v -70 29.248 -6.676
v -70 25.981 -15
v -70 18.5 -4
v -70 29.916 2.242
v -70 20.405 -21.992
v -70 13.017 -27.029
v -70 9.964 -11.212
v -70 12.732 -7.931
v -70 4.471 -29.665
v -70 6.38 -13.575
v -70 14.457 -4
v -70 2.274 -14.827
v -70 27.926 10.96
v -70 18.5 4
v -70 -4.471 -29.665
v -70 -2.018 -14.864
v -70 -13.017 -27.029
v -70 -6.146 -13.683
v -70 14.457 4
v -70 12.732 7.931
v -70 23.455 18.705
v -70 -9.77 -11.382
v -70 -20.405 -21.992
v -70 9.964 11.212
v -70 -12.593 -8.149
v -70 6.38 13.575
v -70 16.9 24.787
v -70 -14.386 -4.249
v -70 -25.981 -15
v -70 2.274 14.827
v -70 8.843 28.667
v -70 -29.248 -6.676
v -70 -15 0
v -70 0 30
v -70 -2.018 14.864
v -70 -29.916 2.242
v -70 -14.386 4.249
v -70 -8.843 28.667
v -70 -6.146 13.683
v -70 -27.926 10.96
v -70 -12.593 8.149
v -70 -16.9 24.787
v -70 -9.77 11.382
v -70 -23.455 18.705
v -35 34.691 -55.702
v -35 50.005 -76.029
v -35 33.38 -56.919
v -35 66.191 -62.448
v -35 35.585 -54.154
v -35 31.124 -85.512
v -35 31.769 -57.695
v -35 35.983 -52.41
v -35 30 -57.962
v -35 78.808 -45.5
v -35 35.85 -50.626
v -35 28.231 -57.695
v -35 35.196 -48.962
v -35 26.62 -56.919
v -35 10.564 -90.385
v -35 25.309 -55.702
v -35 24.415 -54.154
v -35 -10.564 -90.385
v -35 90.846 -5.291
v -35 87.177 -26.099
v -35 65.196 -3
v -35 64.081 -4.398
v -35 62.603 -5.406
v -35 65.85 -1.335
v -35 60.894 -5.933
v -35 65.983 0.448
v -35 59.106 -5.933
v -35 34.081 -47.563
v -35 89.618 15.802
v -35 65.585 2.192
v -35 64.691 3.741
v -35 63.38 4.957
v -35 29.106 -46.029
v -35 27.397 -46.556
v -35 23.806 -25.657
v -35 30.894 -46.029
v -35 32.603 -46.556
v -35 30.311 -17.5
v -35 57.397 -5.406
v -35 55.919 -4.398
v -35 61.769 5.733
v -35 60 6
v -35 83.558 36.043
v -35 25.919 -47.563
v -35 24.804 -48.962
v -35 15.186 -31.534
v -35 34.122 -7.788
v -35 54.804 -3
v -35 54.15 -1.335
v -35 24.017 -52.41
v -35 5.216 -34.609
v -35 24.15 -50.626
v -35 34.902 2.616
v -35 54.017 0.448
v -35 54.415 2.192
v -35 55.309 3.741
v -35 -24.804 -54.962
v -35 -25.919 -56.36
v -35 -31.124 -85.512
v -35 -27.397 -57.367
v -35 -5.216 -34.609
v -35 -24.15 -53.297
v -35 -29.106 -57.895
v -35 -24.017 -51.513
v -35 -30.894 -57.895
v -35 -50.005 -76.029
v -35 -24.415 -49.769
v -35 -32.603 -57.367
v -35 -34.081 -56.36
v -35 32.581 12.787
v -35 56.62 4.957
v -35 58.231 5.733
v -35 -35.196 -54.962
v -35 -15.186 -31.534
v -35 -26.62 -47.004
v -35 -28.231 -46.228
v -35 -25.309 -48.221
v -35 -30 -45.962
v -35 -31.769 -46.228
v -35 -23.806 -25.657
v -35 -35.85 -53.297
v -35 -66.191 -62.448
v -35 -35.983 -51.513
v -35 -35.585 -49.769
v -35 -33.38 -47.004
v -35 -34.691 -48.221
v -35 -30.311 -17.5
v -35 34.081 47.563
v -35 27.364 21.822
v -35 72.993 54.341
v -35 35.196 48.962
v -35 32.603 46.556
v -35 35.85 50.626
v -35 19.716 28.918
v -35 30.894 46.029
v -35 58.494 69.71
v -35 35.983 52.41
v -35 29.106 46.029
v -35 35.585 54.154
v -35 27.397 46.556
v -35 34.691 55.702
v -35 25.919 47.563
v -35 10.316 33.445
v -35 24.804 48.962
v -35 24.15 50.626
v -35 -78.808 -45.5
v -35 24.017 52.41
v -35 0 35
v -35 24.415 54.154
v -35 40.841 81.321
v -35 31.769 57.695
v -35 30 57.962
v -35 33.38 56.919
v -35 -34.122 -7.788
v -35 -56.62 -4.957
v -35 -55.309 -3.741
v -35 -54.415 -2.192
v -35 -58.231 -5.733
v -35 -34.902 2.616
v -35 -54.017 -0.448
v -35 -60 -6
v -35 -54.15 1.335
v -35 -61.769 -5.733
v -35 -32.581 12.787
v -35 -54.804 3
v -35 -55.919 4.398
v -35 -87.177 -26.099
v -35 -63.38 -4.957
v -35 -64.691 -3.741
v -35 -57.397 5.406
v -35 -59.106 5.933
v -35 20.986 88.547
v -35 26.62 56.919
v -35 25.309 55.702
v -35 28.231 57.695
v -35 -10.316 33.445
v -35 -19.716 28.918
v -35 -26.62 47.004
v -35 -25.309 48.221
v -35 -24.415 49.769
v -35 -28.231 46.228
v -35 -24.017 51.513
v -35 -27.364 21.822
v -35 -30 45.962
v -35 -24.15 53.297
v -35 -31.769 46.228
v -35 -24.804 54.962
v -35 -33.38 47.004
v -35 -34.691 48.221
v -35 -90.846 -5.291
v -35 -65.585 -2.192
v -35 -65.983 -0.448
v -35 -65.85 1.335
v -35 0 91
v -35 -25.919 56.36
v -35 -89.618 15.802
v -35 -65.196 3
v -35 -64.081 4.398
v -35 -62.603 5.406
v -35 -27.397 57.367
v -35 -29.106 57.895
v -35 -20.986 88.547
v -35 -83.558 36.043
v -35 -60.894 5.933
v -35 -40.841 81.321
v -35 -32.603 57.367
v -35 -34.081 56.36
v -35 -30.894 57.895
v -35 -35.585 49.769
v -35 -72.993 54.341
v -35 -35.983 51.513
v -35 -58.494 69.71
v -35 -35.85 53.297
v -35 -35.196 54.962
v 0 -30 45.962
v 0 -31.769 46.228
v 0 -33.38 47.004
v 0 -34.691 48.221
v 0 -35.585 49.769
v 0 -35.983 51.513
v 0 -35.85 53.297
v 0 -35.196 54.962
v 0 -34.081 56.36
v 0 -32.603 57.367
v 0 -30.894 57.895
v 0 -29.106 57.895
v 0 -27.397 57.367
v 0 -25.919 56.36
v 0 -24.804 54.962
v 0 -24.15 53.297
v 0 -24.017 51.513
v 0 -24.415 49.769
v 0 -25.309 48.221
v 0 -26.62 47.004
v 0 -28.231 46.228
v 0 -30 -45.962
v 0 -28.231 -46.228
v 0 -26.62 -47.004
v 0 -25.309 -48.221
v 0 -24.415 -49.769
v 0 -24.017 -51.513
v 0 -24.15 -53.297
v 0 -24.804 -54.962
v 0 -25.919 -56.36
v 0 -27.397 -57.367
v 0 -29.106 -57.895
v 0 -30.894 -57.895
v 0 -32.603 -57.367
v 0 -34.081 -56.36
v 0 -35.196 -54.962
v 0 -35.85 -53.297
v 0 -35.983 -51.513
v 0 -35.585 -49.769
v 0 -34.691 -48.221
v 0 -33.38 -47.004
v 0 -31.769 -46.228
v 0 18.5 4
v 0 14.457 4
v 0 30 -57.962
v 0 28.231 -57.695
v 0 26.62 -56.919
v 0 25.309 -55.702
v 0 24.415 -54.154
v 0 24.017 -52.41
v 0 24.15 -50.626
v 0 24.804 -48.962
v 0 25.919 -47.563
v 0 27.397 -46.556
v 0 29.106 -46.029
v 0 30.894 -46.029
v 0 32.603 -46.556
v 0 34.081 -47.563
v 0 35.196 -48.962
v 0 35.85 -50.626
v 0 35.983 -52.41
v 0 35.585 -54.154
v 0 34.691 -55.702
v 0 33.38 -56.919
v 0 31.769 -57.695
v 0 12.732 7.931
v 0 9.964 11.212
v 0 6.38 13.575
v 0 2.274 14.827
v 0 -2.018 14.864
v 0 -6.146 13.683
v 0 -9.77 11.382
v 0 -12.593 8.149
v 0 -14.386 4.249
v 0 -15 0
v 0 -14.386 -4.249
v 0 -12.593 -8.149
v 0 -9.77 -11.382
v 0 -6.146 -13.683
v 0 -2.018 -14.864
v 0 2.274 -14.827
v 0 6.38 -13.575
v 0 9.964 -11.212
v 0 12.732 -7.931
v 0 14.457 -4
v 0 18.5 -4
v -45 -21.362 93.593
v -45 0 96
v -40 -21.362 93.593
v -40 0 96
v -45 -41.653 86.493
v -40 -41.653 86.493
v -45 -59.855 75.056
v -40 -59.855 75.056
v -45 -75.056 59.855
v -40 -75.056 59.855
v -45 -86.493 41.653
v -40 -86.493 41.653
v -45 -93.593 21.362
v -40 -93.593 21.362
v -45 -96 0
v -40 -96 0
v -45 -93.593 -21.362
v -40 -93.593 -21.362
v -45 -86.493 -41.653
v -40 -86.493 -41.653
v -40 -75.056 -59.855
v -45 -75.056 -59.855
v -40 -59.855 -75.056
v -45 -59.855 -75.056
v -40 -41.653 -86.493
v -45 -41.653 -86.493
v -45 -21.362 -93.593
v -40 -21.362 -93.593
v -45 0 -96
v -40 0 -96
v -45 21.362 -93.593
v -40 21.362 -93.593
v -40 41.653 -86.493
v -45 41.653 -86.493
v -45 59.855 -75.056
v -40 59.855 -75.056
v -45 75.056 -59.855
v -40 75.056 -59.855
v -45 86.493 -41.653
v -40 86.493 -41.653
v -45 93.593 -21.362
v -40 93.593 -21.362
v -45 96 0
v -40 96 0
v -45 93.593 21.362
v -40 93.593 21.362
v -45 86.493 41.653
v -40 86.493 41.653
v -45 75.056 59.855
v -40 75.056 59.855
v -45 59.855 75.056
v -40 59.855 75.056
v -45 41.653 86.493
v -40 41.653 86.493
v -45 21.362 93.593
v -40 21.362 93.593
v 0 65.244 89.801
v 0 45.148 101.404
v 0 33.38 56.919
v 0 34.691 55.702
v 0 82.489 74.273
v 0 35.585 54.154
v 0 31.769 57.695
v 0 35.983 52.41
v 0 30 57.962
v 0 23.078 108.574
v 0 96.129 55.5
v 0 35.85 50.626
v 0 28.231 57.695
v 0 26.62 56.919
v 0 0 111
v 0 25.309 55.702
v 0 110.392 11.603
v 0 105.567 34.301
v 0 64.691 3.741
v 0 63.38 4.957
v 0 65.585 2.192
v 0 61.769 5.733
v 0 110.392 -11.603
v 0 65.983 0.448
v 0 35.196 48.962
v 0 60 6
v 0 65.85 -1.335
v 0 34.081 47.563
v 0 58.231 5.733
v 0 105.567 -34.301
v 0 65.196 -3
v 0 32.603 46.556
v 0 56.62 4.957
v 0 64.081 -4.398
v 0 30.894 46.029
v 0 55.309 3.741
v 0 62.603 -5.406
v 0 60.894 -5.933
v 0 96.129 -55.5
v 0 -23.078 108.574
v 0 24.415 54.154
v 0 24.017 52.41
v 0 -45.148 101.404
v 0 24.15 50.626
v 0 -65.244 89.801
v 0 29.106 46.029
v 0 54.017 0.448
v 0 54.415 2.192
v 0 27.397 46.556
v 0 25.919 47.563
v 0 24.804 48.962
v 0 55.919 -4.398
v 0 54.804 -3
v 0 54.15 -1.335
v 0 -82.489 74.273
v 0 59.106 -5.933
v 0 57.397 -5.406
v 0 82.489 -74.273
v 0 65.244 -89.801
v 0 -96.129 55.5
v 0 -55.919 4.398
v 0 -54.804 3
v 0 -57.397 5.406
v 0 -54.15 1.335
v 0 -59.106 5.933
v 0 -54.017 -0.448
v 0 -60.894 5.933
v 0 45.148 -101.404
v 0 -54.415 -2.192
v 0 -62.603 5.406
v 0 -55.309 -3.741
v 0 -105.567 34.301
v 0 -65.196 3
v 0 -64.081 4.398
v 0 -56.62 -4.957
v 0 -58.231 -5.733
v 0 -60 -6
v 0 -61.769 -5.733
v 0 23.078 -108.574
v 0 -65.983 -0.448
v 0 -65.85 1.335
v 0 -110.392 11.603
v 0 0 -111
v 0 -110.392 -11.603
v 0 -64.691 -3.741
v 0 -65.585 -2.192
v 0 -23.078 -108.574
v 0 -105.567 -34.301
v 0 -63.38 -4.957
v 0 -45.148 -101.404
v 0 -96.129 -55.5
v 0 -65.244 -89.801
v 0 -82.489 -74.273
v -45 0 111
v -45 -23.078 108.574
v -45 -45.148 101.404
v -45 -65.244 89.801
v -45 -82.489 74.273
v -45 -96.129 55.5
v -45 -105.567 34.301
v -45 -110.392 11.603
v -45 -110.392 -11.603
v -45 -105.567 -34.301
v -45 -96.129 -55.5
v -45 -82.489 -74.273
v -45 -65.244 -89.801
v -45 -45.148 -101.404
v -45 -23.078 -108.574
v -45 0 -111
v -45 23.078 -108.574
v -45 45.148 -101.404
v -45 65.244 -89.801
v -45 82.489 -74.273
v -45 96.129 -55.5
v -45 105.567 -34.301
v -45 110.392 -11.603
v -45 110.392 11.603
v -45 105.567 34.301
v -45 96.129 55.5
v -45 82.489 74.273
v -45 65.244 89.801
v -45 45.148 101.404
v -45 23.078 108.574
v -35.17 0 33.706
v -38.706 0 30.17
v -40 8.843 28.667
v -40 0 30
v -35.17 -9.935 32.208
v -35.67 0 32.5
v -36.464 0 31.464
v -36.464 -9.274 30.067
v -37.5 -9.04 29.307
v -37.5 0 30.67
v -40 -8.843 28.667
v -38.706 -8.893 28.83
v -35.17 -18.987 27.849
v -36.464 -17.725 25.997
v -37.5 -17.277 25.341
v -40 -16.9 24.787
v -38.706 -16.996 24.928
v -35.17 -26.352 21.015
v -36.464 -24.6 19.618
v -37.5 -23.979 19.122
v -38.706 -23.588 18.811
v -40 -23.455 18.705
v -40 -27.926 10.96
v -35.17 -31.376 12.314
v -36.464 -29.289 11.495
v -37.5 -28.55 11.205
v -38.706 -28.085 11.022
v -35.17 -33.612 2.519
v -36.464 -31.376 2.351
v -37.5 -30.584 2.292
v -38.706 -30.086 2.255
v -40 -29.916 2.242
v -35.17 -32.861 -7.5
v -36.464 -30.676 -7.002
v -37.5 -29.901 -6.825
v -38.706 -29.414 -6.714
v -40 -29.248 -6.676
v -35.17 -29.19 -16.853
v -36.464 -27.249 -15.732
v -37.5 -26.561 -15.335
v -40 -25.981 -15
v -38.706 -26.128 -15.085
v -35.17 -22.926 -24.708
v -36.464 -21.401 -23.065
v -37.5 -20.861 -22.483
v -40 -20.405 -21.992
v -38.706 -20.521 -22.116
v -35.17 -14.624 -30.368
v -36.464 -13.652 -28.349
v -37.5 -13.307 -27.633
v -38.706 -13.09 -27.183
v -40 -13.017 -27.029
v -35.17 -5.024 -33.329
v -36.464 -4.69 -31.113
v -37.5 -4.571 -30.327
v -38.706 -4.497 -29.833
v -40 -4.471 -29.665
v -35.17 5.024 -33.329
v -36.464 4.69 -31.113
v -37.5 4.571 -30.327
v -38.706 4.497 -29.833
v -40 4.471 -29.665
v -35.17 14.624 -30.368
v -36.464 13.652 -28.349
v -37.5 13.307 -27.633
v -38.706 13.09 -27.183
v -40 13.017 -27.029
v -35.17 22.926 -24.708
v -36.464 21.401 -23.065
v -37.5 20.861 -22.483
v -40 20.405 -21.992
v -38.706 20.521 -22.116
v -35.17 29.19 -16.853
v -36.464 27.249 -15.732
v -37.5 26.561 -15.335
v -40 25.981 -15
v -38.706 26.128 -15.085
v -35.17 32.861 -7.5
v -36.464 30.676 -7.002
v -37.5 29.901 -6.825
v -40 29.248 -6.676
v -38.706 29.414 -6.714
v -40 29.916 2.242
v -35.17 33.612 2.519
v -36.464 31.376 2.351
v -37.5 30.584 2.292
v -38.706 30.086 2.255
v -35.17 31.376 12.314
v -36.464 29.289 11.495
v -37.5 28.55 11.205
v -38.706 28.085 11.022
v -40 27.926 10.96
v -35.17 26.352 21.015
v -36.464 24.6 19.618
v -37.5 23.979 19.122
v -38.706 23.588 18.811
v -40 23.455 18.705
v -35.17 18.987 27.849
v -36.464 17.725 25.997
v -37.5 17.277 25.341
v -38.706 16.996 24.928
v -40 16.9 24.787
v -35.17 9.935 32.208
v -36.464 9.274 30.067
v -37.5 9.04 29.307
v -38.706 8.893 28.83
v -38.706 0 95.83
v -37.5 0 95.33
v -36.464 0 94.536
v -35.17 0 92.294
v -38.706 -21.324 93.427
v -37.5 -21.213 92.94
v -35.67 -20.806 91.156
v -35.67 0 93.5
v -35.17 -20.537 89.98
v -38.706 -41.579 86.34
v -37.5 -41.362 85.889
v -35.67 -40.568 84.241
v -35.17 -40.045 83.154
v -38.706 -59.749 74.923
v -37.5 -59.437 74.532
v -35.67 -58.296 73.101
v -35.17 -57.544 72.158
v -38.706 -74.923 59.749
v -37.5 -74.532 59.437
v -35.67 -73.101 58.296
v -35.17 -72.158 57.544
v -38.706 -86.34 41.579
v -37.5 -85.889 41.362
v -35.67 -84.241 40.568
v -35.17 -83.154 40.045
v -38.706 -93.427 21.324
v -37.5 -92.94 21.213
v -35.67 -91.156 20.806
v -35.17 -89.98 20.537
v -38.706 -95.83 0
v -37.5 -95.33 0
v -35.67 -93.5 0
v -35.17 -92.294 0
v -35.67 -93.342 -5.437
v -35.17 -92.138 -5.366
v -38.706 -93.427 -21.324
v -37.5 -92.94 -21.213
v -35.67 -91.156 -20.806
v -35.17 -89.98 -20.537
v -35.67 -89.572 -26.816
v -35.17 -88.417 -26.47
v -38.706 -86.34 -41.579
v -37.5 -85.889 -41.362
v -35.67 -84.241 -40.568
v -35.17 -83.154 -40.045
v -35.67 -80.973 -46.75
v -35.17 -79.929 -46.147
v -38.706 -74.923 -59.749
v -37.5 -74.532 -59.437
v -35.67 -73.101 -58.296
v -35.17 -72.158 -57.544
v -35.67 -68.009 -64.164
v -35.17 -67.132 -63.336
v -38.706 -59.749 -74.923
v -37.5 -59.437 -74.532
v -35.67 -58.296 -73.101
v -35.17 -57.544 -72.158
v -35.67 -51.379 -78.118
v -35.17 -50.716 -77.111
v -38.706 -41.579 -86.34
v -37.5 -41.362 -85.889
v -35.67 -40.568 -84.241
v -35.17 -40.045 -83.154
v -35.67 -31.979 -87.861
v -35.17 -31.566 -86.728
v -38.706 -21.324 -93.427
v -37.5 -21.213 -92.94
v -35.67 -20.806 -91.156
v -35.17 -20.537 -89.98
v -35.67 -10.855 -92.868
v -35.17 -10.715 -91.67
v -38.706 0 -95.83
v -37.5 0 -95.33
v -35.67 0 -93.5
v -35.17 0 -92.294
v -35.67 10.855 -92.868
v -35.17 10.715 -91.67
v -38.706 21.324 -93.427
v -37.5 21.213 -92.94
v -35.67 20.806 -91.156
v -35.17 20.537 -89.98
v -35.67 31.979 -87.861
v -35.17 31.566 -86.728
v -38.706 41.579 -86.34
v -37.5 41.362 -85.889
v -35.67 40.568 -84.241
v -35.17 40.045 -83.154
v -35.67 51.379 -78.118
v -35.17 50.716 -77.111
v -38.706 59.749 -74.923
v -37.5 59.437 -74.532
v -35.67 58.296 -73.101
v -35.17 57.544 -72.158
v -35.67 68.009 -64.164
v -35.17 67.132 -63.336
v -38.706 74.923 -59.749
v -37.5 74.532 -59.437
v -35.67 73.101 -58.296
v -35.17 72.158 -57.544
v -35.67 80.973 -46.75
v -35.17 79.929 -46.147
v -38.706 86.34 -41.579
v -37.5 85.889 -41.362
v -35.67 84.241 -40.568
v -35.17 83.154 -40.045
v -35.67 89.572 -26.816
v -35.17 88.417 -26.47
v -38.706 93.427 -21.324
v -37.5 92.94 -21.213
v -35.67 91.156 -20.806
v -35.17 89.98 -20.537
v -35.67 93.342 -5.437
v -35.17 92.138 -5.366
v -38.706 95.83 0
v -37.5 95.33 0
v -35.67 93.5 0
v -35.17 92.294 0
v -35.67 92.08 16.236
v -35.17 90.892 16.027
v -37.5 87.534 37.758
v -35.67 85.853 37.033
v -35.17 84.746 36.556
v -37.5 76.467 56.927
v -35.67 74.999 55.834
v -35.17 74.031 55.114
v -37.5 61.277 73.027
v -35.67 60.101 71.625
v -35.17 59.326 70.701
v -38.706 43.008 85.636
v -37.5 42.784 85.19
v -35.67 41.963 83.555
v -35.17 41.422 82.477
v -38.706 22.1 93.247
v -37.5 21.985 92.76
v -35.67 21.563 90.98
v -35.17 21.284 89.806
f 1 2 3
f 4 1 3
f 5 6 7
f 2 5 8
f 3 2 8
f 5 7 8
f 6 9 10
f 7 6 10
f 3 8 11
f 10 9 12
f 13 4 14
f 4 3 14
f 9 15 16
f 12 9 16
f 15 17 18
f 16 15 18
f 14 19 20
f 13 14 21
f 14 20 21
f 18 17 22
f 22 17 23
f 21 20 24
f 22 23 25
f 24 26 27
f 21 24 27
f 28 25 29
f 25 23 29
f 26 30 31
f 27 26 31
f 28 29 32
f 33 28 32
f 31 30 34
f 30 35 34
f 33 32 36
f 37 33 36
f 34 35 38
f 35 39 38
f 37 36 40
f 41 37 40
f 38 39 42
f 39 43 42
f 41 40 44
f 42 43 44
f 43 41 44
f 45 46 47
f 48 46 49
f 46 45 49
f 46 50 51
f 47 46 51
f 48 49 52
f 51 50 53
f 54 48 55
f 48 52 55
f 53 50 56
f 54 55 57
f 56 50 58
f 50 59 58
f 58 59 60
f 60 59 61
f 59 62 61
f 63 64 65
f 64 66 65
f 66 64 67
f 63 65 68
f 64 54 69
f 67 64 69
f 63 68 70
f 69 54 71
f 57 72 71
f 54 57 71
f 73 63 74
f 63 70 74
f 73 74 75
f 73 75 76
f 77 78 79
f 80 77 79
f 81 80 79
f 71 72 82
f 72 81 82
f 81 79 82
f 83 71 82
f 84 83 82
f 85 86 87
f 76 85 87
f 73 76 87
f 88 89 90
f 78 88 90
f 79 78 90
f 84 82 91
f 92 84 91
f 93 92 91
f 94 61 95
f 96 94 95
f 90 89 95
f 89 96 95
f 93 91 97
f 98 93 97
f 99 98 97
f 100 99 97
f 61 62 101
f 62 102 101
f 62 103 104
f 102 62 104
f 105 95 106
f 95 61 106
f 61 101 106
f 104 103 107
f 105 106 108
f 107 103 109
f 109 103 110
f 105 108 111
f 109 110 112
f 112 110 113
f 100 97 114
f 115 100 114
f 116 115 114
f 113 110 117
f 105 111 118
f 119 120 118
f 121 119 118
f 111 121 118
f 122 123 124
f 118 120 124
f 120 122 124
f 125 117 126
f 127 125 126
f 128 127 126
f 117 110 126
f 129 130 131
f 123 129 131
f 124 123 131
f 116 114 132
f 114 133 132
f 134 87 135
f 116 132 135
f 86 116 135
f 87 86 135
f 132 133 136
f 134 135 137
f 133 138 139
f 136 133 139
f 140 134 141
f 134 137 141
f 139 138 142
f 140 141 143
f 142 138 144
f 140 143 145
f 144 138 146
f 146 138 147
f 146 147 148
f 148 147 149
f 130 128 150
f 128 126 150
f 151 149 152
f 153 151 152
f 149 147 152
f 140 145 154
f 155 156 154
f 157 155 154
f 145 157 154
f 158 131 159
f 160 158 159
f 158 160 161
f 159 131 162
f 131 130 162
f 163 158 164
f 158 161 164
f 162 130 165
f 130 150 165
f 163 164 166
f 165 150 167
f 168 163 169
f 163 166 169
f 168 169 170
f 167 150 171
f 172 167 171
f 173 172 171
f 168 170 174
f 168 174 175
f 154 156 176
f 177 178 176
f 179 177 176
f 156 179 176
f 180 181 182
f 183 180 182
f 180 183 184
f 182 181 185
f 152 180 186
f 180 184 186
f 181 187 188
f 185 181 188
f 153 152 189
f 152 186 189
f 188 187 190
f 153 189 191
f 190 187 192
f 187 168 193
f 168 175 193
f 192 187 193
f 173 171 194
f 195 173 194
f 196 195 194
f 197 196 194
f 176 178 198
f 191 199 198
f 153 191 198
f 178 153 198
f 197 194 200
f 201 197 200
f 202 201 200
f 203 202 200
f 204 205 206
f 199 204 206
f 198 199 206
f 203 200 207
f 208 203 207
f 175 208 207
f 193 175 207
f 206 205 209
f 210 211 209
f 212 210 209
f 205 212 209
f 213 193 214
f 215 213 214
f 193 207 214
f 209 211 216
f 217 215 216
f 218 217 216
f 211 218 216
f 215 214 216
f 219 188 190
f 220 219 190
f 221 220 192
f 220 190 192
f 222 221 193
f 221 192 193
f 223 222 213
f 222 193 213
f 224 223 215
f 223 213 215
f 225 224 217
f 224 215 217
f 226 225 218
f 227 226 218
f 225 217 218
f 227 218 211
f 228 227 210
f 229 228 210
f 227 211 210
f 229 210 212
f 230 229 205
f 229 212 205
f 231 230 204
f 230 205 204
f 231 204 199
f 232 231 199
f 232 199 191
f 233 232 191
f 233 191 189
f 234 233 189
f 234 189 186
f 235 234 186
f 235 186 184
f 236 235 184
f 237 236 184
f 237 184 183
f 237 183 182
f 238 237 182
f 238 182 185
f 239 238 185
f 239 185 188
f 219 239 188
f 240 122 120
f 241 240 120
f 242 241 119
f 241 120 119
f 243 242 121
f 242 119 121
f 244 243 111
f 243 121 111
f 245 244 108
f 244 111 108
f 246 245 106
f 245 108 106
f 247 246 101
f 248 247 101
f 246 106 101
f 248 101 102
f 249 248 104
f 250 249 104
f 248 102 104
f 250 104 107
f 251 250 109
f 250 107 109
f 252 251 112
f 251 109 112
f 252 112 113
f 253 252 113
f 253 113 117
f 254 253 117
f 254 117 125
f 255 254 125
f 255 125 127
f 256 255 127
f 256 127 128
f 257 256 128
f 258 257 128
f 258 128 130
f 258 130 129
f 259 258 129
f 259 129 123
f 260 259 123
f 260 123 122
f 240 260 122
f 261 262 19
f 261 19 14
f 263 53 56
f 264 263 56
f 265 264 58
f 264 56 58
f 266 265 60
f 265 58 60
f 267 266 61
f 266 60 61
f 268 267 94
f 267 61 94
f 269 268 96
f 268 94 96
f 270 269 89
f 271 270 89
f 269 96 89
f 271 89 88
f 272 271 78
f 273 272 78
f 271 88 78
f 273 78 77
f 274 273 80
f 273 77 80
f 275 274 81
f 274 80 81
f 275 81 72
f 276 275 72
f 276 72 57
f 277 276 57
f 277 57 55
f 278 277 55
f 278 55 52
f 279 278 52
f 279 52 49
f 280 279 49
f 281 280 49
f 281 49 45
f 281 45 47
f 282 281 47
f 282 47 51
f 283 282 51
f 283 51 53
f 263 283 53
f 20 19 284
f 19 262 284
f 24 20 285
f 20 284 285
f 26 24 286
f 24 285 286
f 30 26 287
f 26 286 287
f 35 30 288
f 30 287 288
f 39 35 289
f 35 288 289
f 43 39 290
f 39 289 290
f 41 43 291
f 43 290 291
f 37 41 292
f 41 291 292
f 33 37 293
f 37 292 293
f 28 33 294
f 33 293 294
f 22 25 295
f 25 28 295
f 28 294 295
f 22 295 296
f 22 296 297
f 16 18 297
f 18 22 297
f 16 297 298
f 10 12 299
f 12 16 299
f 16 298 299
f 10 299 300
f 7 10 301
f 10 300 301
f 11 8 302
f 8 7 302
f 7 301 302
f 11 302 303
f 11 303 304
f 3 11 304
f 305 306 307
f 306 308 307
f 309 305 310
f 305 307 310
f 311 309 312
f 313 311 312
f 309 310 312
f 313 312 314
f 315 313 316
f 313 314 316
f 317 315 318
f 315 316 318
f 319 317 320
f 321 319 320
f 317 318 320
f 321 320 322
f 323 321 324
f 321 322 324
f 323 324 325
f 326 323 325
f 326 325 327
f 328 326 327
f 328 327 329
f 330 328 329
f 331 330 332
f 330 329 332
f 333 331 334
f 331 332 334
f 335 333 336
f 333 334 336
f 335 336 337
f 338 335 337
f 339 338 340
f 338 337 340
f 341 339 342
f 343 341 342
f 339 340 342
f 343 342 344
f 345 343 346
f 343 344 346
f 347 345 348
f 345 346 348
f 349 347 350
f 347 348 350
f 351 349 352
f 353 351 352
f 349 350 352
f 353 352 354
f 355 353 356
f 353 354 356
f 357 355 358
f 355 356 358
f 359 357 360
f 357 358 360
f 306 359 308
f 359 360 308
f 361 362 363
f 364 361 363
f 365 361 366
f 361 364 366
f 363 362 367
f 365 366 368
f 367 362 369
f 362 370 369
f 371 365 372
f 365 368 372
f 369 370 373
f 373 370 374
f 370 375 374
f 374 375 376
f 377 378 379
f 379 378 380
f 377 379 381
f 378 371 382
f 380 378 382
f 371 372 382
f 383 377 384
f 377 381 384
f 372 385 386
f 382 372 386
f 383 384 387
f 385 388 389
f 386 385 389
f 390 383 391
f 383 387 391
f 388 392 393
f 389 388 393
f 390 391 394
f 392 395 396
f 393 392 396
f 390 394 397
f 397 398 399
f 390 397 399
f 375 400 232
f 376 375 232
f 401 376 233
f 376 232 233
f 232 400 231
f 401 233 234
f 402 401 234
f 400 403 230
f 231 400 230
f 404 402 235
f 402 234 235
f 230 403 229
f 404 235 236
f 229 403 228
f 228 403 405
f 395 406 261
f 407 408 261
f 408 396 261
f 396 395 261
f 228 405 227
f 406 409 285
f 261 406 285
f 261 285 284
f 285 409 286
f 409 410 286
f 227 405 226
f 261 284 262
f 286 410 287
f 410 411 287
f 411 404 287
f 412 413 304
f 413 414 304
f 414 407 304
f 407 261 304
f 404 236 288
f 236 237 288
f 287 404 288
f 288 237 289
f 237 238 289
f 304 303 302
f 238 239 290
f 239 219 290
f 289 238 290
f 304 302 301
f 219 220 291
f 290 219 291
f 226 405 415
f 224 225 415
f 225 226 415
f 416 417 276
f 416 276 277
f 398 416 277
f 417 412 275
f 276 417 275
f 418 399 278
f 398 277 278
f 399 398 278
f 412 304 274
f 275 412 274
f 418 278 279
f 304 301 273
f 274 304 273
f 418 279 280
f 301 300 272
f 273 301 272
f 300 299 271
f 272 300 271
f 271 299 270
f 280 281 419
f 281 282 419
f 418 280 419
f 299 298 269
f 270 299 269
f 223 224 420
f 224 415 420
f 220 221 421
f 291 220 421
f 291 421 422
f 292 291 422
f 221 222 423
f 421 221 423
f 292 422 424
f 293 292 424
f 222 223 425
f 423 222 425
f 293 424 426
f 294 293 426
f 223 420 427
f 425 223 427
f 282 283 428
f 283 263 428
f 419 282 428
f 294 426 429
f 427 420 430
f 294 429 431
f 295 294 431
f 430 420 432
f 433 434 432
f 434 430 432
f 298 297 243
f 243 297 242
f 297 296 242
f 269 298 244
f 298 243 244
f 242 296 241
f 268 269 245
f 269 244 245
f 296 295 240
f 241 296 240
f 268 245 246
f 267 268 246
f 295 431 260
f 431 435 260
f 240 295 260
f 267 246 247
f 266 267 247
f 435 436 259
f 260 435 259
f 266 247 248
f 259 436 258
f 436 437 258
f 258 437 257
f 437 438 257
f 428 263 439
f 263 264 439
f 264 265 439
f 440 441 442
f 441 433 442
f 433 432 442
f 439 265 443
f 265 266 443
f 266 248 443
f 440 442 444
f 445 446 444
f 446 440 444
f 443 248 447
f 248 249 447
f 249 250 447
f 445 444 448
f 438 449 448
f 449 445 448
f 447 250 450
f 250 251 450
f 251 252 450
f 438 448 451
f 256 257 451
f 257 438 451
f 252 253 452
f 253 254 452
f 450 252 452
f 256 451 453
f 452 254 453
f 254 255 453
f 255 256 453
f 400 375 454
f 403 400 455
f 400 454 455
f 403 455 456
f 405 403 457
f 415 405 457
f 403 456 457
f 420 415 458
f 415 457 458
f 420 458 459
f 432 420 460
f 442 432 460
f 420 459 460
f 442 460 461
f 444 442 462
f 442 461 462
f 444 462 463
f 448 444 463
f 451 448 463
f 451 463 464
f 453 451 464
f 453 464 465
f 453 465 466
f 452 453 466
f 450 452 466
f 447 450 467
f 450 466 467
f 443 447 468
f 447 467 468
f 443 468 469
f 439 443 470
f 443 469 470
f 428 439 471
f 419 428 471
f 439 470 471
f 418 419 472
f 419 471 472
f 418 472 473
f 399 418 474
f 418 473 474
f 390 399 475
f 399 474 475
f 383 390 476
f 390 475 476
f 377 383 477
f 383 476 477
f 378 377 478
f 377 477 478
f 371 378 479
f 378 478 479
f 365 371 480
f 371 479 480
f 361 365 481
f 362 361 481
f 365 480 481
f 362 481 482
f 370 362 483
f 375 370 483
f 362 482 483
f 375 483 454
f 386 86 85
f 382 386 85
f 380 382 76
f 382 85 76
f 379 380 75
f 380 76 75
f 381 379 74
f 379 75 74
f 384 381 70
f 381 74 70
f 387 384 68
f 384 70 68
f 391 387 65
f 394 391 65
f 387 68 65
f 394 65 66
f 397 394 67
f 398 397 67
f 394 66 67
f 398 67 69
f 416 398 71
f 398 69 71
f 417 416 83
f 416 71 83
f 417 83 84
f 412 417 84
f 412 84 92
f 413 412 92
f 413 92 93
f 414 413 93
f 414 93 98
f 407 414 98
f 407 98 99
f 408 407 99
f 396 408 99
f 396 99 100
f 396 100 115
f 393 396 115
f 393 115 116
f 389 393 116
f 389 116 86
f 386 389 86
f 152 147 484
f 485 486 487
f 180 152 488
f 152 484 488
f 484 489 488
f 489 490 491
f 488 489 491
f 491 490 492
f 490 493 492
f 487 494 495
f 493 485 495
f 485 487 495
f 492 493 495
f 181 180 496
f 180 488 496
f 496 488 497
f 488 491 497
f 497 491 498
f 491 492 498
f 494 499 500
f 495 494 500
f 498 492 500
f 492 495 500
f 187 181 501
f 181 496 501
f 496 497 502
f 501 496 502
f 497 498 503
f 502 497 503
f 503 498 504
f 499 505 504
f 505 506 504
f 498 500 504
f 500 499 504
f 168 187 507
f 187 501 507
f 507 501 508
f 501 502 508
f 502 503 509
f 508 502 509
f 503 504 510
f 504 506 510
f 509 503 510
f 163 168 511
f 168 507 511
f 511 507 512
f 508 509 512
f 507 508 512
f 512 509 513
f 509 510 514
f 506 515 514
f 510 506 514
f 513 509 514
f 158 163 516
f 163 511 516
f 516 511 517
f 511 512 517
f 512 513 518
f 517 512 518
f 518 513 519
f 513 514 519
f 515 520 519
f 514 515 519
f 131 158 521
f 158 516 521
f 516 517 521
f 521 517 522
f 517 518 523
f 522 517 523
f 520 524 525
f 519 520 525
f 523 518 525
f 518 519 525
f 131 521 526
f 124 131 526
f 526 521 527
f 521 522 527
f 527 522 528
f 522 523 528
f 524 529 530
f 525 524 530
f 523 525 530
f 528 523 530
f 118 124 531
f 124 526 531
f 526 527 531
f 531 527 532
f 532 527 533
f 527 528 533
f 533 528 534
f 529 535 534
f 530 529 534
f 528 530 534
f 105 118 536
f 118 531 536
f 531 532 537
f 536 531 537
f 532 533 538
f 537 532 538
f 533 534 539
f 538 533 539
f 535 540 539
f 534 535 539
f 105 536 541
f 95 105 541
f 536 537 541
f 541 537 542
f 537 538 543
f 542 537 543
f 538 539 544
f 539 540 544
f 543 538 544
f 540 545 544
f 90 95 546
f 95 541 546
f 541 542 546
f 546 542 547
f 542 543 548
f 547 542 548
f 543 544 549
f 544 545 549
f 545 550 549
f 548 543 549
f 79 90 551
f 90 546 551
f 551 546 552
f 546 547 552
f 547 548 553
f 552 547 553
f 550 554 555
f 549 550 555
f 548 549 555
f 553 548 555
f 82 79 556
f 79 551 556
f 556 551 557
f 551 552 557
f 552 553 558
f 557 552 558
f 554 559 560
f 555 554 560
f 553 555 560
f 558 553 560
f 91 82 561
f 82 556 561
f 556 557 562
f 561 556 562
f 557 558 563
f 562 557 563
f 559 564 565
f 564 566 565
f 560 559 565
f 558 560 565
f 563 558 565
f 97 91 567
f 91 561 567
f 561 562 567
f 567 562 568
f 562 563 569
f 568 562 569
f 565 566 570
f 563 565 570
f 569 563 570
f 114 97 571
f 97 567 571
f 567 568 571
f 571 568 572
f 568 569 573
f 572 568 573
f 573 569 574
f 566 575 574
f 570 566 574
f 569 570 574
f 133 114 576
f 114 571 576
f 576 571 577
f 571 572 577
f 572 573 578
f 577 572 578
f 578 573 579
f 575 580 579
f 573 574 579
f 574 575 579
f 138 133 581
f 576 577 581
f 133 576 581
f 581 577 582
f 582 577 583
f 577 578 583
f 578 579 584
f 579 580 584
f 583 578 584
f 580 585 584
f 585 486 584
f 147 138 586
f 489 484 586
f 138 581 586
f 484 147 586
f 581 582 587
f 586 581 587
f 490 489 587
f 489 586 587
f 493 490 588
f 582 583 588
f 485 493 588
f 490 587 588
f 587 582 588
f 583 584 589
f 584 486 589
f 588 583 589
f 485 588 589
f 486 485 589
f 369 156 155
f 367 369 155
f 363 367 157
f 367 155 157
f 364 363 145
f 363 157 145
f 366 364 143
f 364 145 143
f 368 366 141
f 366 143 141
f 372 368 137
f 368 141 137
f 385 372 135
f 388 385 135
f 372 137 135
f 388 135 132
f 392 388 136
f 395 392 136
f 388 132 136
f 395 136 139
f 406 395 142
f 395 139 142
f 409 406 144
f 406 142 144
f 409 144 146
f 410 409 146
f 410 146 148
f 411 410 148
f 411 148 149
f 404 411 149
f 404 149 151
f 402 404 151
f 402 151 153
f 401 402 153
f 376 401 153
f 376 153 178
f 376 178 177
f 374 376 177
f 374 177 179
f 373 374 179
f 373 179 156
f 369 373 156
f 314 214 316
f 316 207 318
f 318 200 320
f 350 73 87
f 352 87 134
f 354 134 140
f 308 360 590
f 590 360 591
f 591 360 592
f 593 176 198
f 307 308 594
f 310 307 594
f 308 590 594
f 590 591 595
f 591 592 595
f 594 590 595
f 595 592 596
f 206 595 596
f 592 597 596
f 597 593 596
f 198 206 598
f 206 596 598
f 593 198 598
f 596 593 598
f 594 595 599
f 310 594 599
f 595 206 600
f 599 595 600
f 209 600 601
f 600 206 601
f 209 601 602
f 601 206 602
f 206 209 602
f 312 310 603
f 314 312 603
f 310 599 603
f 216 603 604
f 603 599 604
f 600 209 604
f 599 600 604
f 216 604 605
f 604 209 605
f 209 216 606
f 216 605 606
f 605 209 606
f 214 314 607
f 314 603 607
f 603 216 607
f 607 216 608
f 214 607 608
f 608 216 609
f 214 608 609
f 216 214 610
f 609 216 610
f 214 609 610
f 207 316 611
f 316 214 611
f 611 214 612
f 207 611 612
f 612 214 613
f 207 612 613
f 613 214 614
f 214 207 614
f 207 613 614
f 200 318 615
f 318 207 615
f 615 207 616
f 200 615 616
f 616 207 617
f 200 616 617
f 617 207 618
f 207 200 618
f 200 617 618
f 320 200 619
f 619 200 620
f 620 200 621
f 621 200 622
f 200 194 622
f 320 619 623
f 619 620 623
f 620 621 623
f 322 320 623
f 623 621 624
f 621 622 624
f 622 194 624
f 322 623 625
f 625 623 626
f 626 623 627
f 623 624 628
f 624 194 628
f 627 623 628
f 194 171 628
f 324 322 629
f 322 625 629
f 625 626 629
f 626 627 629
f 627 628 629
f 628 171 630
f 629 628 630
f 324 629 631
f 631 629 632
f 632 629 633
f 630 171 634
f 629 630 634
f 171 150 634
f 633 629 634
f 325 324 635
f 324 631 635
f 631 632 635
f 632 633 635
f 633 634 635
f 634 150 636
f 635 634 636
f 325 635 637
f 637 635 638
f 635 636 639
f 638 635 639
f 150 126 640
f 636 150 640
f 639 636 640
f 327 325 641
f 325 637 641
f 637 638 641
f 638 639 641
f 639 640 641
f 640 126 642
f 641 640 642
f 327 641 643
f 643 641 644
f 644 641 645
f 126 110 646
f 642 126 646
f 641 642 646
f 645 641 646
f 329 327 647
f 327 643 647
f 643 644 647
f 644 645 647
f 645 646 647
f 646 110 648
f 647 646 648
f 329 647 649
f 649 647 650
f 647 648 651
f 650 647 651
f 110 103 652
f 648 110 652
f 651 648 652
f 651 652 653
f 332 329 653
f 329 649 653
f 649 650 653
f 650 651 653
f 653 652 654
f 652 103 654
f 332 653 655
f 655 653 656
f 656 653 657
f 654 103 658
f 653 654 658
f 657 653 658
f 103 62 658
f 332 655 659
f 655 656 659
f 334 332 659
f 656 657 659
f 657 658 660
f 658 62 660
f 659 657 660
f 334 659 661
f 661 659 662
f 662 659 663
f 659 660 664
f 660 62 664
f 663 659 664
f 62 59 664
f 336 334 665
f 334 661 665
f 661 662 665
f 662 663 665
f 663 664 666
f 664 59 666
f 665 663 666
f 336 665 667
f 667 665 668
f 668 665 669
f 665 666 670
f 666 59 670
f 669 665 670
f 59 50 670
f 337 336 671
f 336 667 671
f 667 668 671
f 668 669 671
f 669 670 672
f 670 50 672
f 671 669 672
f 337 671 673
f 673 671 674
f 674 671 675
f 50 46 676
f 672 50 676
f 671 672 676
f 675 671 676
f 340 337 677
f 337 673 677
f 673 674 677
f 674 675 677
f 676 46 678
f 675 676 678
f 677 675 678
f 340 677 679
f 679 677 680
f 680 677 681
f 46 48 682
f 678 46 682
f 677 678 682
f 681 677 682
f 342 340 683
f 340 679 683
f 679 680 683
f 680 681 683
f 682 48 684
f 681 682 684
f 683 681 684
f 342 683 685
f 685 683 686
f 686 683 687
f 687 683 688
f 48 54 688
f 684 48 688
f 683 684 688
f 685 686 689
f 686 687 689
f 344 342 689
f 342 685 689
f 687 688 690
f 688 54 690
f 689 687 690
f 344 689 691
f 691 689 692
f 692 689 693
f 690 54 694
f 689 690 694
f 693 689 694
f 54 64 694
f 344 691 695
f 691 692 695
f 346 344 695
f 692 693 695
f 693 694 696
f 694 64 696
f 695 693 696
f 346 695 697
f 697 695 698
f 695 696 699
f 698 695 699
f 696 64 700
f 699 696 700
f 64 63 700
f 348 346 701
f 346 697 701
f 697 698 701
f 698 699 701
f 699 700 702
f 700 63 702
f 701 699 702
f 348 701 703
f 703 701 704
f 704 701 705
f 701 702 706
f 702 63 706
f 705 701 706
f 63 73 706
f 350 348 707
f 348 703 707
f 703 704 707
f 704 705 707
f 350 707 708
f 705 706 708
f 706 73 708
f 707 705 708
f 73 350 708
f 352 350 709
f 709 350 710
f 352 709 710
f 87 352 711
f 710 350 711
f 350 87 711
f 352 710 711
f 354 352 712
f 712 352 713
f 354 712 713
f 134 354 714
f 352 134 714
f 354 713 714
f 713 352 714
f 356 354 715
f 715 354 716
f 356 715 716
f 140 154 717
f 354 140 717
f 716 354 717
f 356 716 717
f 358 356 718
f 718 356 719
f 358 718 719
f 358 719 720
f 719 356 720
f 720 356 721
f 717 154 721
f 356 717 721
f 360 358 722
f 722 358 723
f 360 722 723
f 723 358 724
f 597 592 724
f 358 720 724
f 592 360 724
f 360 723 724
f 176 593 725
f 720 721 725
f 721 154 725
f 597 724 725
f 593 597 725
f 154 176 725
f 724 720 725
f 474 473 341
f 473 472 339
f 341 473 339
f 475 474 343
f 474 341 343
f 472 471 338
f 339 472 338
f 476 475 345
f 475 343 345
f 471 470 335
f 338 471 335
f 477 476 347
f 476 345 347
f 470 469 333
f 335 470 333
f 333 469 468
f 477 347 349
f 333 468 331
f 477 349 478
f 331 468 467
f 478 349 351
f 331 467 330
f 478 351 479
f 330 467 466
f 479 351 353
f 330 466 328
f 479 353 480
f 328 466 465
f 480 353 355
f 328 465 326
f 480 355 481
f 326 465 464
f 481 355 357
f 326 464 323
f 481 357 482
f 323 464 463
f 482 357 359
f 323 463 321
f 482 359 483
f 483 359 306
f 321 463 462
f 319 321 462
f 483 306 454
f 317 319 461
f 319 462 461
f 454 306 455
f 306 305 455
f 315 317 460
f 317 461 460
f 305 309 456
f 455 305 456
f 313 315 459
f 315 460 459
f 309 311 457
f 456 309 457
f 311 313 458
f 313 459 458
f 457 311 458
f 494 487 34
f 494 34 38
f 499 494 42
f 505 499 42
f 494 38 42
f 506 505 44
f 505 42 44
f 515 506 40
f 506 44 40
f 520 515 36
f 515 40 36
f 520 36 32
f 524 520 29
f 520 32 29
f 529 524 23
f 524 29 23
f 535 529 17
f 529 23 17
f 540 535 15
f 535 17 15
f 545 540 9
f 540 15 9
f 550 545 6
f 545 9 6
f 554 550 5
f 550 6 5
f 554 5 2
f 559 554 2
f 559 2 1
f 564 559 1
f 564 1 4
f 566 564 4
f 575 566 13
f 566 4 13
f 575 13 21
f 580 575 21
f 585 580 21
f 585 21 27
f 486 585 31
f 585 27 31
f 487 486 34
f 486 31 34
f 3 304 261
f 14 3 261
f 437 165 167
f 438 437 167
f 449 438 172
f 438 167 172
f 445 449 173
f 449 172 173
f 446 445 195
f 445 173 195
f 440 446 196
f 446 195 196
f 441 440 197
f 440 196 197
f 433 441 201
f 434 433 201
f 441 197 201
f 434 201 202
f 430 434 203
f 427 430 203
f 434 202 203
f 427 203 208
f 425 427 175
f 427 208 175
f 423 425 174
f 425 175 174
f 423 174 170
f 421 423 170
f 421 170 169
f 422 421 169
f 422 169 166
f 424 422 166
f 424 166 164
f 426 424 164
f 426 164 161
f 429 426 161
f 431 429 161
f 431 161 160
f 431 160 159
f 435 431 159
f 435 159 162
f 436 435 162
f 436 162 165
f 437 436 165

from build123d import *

# Parameters (mm, degrees)
SKETCH5_W          = 8
SKETCH5_H          = 7
CUT_EXTRUDE5_DEPTH = 172.877863613
SKETCH12_R         = 6
CUT_EXTRUDE6_DEPTH = 161.832210704


with BuildPart() as part:
    # Sketch2 → Revolve3 (revolve)
    with BuildSketch(Plane(origin=(0, 0, 0), x_dir=(1, 0, 0), z_dir=(0, 1, 0)), mode=Mode.PRIVATE) as revolve3_sk:
        with BuildLine():
            Line((0, 15), (0, 111))
            Line((0, 111), (-45, 111))
            Line((-45, 111), (-45, 96))
            Line((-45, 96), (-40, 96))
            ThreePointArc((-40, 96), (-36.464466094, 94.535533906), (-35, 91))
            Line((-35, 91), (-35, 35))
            ThreePointArc((-35, 35), (-36.464466094, 31.464466094), (-40, 30))
            Line((-40, 30), (-70, 30))
            Line((-70, 30), (-70, 15))
            Line((-70, 15), (0, 15))
        make_face()
    revolve(revolve3_sk.sketch.rotate(Axis((0, 0, 0), (1, 0, 0)), 180), axis=Axis((0, 0, 0), (1, 0, 0)))

    # Sketch5 → Cut-Extrude5 (cut, through all)
    with BuildSketch(Plane.ZY.offset(70)):
        with Locations((0, 15)):
            Rectangle(SKETCH5_W, SKETCH5_H)
    extrude(amount=-CUT_EXTRUDE5_DEPTH, mode=Mode.SUBTRACT)

    # Sketch12 → Cut-Extrude6 (cut, through all)
    with BuildSketch(Plane.ZY.offset(35)):
        with Locations((51.961524227, 30)):
            Circle(SKETCH12_R)
        with Locations(Location((-51.961524227, 30, 0), (0, 0, 180))):
            Circle(SKETCH12_R)
        with Locations(Location((51.961524227, -30, 0), (0, 0, 180))):
            Circle(SKETCH12_R)
        with Locations((-51.961524227, -30)):
            Circle(SKETCH12_R)
        with Locations((0, 60)):
            Circle(SKETCH12_R)
        with Locations(Location((0, -60, 0), (0, 0, 180))):
            Circle(SKETCH12_R)
    extrude(amount=-CUT_EXTRUDE6_DEPTH, mode=Mode.SUBTRACT)


solid = part.part
